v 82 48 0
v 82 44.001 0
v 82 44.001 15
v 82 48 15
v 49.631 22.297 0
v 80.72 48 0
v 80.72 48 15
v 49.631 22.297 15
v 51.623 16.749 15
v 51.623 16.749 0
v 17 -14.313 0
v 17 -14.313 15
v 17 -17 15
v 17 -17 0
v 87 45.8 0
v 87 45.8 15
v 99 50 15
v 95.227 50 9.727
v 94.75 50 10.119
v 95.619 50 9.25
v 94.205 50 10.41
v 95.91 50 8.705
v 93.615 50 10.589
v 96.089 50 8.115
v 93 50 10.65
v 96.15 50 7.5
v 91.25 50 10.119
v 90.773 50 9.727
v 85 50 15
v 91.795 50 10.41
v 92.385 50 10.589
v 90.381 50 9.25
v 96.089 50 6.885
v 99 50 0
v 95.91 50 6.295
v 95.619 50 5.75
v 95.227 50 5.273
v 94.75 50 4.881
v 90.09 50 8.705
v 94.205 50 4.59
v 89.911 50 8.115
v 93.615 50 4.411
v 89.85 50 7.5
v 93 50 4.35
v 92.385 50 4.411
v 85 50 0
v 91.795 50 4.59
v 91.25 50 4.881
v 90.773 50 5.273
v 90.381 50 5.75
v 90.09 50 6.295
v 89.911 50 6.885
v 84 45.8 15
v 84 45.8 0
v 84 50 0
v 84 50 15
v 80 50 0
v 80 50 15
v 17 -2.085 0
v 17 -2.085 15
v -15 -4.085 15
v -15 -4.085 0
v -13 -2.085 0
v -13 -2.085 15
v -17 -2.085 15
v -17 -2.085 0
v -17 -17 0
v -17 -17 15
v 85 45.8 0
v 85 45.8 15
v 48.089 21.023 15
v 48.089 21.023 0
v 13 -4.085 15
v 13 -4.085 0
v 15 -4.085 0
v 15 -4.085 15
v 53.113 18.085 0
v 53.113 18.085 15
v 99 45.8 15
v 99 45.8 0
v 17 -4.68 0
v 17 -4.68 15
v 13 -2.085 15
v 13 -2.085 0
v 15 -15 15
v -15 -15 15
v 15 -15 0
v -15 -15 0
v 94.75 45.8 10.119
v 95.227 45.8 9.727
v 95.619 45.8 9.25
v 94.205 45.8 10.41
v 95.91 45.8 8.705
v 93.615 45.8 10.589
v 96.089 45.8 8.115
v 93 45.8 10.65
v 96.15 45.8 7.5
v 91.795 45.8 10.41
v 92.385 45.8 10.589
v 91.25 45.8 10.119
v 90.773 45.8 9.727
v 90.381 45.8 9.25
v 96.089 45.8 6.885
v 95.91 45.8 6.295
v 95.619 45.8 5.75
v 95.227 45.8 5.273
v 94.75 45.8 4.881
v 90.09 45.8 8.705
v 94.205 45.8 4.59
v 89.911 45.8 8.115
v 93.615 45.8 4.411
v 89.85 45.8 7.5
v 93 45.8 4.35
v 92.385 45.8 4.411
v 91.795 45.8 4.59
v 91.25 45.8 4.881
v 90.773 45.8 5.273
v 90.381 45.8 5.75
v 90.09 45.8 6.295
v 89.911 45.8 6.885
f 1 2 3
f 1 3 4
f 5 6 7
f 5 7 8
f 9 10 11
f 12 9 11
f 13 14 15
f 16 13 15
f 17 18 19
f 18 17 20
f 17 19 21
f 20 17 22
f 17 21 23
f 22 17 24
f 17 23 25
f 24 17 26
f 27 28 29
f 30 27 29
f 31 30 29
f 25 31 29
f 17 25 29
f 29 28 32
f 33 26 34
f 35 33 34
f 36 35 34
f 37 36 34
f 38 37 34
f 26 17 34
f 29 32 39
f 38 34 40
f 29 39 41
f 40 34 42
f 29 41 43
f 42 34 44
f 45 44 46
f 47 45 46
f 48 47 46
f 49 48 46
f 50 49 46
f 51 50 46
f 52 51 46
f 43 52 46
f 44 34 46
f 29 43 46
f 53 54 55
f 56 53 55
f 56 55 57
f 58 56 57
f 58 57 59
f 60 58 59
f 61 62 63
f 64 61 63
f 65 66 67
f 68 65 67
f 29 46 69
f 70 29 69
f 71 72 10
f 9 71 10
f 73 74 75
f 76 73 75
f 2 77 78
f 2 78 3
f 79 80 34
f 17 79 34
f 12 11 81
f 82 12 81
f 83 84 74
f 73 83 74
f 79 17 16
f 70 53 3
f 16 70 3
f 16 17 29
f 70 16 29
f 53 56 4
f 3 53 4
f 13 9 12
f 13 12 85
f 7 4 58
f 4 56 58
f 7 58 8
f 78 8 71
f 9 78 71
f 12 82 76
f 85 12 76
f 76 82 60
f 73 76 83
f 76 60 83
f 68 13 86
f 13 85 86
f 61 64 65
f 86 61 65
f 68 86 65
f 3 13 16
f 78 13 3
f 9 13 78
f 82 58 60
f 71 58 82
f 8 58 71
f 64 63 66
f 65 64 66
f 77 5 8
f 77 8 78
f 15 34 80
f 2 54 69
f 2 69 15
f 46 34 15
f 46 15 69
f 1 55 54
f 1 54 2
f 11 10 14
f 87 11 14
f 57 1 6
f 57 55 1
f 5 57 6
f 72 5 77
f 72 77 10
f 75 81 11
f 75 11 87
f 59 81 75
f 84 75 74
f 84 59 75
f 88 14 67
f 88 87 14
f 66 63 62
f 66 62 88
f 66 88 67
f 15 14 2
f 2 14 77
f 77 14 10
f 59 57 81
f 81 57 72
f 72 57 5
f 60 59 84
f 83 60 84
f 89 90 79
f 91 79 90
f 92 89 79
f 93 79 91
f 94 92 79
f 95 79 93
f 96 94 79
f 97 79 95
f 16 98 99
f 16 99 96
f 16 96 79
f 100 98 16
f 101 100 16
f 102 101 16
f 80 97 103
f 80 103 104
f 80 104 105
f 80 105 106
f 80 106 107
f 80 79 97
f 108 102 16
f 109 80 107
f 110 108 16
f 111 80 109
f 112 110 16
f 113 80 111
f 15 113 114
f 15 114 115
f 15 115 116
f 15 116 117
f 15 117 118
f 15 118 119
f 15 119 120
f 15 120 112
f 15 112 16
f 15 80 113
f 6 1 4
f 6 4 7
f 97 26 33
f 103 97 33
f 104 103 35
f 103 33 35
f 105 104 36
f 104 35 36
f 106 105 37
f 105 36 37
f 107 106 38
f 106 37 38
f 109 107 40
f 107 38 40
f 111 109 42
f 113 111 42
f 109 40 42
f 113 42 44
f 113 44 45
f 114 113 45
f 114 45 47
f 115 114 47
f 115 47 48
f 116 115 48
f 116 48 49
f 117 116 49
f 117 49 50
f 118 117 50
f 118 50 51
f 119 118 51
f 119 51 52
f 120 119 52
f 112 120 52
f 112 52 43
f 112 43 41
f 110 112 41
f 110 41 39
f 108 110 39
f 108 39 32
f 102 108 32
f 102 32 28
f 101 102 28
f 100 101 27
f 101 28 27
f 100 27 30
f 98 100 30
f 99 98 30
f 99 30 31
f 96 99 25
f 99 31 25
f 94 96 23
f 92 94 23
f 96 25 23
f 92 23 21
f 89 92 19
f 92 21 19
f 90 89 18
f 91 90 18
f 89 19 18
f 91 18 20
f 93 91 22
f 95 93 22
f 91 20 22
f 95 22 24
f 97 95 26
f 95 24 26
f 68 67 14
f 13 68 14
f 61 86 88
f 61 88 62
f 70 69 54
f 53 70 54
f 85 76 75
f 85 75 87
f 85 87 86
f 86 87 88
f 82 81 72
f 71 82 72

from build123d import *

# Parameters (mm, degrees)
BOSS_EXTRUDE1_DEPTH = 15
BOSS_EXTRUDE2_DEPTH = 15
SKETCH3_W           = 12
SKETCH3_H           = 4.2
BOSS_EXTRUDE3_DEPTH = 15
CUT_EXTRUDE1_REACH  = 69
SKETCH4_R           = 3.15


with BuildPart() as part:
    # Sketch1 → Boss-Extrude1 (new body)
    with BuildSketch(Plane.XY):
        Polygon((-15, -15), (-15, -4.085), (-13, -2.085), (-17, -2.085), (-17, -17), (17, -17), (17, -2.085), (13, -2.085), (13, -4.085), (15, -4.085), (15, -15), align=None)
    extrude(amount=BOSS_EXTRUDE1_DEPTH)

    # Sketch2 → Boss-Extrude2 (add)
    with BuildSketch(Plane(origin=(0, 0, 0), x_dir=(-1, 0, 0), z_dir=(0, 0, -1))):
        Polygon((-80, 50), (-17, -2.085), (-17, -4.68000212), (-48.089133488, 21.022815621), (-51.622859883, 16.748556949), (-17, -14.313094489), (-17, -17), (-87, 45.8), (-87, 50), (-85, 50), (-85, 45.8), (-84, 45.8), (-84, 50), align=None)
        Polygon((-80.719691535, 48), (-49.630558047, 22.297182259), (-53.112776785, 18.085225255), (-82, 44.001191225), (-82, 48), align=None, mode=Mode.SUBTRACT)
    extrude(amount=-BOSS_EXTRUDE2_DEPTH)

    # Sketch3 → Boss-Extrude3 (add)
    with BuildSketch(Plane(origin=(0, 0, 0), x_dir=(-1, 0, 0), z_dir=(0, 0, -1))):
        with Locations((-93, 47.9)):
            Rectangle(SKETCH3_W, SKETCH3_H)
    extrude(amount=-BOSS_EXTRUDE3_DEPTH)

    # Sketch4 → Cut-Extrude1 (cut, up to next)
    with BuildSketch(Plane(origin=(0, 50, 0), x_dir=(1, 0, 0), z_dir=(0, 1, 0)), mode=Mode.PRIVATE) as cut_extrude1_sk1:
        with Locations((93, -7.5)):
            Circle(SKETCH4_R)
    cut_extrude1_tool1 = extrude(cut_extrude1_sk1.sketch, amount=-CUT_EXTRUDE1_REACH, mode=Mode.PRIVATE) & part.part
    add(cut_extrude1_tool1.solids().sort_by_distance((93, 50, 7.5))[0], mode=Mode.SUBTRACT)


solid = part.part
